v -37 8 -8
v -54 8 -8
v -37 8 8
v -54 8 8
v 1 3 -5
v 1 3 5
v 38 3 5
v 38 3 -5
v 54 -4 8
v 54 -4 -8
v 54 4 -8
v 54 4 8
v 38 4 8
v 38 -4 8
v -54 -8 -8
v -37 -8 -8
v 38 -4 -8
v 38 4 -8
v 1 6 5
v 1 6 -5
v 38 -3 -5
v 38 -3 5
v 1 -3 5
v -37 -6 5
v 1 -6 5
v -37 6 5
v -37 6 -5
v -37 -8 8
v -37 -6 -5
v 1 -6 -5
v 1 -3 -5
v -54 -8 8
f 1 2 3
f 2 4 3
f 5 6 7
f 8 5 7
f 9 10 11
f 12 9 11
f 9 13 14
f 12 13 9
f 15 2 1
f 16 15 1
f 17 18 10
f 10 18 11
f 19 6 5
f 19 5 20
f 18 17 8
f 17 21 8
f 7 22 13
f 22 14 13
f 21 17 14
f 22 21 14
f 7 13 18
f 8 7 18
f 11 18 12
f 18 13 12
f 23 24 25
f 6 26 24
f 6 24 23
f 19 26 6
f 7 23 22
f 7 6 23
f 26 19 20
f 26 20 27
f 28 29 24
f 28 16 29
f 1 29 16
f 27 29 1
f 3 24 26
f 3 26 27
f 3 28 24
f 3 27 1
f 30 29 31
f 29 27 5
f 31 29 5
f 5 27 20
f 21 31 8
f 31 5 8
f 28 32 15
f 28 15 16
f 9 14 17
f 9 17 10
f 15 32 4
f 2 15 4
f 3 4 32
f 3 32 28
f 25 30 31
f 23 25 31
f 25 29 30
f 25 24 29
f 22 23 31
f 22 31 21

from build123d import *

# Parameters (mm, degrees)
SKETCH1_W             = 17
SKETCH1_H             = 16
BOSS_EXTRUDE1_DEPTH   = 8
SKETCH1_W_2           = 16
SKETCH1_H_2           = 8
BOSS_EXTRUDE1_2_DEPTH = 8
SKETCH1_3_W           = 37
SKETCH1_3_H           = 6
BOSS_EXTRUDE2_DEPTH   = 5


with BuildPart() as part:
    # Sketch1 → Boss-Extrude1 (new, symmetric)
    with BuildSketch(Plane.XY):
        with Locations((-45.5, 0)):
            Rectangle(SKETCH1_W, SKETCH1_H)
    extrude(amount=BOSS_EXTRUDE1_DEPTH, both=True)



with BuildPart() as body_2:
    # Sketch1 → Boss-Extrude1 2 (new, symmetric)
    with BuildSketch(Plane.XY):
        with Locations((46, 0)):
            Rectangle(SKETCH1_W_2, SKETCH1_H_2)
    extrude(amount=BOSS_EXTRUDE1_2_DEPTH, both=True)


with BuildPart() as part_1:
    add(part.part)

    add(body_2.part)  # Boss-Extrude2 merges body 2
    # Sketch1<3> → Boss-Extrude2 (add, symmetric)
    with BuildSketch(Plane.XY):
        Polygon((1, -6), (1, -3), (1, 3), (1, 6), (-37, 6), (-37, -6), align=None)
        with Locations((19.5, 0)):
            Rectangle(SKETCH1_3_W, SKETCH1_3_H)
    extrude(amount=BOSS_EXTRUDE2_DEPTH, both=True)


solid = part_1.part
